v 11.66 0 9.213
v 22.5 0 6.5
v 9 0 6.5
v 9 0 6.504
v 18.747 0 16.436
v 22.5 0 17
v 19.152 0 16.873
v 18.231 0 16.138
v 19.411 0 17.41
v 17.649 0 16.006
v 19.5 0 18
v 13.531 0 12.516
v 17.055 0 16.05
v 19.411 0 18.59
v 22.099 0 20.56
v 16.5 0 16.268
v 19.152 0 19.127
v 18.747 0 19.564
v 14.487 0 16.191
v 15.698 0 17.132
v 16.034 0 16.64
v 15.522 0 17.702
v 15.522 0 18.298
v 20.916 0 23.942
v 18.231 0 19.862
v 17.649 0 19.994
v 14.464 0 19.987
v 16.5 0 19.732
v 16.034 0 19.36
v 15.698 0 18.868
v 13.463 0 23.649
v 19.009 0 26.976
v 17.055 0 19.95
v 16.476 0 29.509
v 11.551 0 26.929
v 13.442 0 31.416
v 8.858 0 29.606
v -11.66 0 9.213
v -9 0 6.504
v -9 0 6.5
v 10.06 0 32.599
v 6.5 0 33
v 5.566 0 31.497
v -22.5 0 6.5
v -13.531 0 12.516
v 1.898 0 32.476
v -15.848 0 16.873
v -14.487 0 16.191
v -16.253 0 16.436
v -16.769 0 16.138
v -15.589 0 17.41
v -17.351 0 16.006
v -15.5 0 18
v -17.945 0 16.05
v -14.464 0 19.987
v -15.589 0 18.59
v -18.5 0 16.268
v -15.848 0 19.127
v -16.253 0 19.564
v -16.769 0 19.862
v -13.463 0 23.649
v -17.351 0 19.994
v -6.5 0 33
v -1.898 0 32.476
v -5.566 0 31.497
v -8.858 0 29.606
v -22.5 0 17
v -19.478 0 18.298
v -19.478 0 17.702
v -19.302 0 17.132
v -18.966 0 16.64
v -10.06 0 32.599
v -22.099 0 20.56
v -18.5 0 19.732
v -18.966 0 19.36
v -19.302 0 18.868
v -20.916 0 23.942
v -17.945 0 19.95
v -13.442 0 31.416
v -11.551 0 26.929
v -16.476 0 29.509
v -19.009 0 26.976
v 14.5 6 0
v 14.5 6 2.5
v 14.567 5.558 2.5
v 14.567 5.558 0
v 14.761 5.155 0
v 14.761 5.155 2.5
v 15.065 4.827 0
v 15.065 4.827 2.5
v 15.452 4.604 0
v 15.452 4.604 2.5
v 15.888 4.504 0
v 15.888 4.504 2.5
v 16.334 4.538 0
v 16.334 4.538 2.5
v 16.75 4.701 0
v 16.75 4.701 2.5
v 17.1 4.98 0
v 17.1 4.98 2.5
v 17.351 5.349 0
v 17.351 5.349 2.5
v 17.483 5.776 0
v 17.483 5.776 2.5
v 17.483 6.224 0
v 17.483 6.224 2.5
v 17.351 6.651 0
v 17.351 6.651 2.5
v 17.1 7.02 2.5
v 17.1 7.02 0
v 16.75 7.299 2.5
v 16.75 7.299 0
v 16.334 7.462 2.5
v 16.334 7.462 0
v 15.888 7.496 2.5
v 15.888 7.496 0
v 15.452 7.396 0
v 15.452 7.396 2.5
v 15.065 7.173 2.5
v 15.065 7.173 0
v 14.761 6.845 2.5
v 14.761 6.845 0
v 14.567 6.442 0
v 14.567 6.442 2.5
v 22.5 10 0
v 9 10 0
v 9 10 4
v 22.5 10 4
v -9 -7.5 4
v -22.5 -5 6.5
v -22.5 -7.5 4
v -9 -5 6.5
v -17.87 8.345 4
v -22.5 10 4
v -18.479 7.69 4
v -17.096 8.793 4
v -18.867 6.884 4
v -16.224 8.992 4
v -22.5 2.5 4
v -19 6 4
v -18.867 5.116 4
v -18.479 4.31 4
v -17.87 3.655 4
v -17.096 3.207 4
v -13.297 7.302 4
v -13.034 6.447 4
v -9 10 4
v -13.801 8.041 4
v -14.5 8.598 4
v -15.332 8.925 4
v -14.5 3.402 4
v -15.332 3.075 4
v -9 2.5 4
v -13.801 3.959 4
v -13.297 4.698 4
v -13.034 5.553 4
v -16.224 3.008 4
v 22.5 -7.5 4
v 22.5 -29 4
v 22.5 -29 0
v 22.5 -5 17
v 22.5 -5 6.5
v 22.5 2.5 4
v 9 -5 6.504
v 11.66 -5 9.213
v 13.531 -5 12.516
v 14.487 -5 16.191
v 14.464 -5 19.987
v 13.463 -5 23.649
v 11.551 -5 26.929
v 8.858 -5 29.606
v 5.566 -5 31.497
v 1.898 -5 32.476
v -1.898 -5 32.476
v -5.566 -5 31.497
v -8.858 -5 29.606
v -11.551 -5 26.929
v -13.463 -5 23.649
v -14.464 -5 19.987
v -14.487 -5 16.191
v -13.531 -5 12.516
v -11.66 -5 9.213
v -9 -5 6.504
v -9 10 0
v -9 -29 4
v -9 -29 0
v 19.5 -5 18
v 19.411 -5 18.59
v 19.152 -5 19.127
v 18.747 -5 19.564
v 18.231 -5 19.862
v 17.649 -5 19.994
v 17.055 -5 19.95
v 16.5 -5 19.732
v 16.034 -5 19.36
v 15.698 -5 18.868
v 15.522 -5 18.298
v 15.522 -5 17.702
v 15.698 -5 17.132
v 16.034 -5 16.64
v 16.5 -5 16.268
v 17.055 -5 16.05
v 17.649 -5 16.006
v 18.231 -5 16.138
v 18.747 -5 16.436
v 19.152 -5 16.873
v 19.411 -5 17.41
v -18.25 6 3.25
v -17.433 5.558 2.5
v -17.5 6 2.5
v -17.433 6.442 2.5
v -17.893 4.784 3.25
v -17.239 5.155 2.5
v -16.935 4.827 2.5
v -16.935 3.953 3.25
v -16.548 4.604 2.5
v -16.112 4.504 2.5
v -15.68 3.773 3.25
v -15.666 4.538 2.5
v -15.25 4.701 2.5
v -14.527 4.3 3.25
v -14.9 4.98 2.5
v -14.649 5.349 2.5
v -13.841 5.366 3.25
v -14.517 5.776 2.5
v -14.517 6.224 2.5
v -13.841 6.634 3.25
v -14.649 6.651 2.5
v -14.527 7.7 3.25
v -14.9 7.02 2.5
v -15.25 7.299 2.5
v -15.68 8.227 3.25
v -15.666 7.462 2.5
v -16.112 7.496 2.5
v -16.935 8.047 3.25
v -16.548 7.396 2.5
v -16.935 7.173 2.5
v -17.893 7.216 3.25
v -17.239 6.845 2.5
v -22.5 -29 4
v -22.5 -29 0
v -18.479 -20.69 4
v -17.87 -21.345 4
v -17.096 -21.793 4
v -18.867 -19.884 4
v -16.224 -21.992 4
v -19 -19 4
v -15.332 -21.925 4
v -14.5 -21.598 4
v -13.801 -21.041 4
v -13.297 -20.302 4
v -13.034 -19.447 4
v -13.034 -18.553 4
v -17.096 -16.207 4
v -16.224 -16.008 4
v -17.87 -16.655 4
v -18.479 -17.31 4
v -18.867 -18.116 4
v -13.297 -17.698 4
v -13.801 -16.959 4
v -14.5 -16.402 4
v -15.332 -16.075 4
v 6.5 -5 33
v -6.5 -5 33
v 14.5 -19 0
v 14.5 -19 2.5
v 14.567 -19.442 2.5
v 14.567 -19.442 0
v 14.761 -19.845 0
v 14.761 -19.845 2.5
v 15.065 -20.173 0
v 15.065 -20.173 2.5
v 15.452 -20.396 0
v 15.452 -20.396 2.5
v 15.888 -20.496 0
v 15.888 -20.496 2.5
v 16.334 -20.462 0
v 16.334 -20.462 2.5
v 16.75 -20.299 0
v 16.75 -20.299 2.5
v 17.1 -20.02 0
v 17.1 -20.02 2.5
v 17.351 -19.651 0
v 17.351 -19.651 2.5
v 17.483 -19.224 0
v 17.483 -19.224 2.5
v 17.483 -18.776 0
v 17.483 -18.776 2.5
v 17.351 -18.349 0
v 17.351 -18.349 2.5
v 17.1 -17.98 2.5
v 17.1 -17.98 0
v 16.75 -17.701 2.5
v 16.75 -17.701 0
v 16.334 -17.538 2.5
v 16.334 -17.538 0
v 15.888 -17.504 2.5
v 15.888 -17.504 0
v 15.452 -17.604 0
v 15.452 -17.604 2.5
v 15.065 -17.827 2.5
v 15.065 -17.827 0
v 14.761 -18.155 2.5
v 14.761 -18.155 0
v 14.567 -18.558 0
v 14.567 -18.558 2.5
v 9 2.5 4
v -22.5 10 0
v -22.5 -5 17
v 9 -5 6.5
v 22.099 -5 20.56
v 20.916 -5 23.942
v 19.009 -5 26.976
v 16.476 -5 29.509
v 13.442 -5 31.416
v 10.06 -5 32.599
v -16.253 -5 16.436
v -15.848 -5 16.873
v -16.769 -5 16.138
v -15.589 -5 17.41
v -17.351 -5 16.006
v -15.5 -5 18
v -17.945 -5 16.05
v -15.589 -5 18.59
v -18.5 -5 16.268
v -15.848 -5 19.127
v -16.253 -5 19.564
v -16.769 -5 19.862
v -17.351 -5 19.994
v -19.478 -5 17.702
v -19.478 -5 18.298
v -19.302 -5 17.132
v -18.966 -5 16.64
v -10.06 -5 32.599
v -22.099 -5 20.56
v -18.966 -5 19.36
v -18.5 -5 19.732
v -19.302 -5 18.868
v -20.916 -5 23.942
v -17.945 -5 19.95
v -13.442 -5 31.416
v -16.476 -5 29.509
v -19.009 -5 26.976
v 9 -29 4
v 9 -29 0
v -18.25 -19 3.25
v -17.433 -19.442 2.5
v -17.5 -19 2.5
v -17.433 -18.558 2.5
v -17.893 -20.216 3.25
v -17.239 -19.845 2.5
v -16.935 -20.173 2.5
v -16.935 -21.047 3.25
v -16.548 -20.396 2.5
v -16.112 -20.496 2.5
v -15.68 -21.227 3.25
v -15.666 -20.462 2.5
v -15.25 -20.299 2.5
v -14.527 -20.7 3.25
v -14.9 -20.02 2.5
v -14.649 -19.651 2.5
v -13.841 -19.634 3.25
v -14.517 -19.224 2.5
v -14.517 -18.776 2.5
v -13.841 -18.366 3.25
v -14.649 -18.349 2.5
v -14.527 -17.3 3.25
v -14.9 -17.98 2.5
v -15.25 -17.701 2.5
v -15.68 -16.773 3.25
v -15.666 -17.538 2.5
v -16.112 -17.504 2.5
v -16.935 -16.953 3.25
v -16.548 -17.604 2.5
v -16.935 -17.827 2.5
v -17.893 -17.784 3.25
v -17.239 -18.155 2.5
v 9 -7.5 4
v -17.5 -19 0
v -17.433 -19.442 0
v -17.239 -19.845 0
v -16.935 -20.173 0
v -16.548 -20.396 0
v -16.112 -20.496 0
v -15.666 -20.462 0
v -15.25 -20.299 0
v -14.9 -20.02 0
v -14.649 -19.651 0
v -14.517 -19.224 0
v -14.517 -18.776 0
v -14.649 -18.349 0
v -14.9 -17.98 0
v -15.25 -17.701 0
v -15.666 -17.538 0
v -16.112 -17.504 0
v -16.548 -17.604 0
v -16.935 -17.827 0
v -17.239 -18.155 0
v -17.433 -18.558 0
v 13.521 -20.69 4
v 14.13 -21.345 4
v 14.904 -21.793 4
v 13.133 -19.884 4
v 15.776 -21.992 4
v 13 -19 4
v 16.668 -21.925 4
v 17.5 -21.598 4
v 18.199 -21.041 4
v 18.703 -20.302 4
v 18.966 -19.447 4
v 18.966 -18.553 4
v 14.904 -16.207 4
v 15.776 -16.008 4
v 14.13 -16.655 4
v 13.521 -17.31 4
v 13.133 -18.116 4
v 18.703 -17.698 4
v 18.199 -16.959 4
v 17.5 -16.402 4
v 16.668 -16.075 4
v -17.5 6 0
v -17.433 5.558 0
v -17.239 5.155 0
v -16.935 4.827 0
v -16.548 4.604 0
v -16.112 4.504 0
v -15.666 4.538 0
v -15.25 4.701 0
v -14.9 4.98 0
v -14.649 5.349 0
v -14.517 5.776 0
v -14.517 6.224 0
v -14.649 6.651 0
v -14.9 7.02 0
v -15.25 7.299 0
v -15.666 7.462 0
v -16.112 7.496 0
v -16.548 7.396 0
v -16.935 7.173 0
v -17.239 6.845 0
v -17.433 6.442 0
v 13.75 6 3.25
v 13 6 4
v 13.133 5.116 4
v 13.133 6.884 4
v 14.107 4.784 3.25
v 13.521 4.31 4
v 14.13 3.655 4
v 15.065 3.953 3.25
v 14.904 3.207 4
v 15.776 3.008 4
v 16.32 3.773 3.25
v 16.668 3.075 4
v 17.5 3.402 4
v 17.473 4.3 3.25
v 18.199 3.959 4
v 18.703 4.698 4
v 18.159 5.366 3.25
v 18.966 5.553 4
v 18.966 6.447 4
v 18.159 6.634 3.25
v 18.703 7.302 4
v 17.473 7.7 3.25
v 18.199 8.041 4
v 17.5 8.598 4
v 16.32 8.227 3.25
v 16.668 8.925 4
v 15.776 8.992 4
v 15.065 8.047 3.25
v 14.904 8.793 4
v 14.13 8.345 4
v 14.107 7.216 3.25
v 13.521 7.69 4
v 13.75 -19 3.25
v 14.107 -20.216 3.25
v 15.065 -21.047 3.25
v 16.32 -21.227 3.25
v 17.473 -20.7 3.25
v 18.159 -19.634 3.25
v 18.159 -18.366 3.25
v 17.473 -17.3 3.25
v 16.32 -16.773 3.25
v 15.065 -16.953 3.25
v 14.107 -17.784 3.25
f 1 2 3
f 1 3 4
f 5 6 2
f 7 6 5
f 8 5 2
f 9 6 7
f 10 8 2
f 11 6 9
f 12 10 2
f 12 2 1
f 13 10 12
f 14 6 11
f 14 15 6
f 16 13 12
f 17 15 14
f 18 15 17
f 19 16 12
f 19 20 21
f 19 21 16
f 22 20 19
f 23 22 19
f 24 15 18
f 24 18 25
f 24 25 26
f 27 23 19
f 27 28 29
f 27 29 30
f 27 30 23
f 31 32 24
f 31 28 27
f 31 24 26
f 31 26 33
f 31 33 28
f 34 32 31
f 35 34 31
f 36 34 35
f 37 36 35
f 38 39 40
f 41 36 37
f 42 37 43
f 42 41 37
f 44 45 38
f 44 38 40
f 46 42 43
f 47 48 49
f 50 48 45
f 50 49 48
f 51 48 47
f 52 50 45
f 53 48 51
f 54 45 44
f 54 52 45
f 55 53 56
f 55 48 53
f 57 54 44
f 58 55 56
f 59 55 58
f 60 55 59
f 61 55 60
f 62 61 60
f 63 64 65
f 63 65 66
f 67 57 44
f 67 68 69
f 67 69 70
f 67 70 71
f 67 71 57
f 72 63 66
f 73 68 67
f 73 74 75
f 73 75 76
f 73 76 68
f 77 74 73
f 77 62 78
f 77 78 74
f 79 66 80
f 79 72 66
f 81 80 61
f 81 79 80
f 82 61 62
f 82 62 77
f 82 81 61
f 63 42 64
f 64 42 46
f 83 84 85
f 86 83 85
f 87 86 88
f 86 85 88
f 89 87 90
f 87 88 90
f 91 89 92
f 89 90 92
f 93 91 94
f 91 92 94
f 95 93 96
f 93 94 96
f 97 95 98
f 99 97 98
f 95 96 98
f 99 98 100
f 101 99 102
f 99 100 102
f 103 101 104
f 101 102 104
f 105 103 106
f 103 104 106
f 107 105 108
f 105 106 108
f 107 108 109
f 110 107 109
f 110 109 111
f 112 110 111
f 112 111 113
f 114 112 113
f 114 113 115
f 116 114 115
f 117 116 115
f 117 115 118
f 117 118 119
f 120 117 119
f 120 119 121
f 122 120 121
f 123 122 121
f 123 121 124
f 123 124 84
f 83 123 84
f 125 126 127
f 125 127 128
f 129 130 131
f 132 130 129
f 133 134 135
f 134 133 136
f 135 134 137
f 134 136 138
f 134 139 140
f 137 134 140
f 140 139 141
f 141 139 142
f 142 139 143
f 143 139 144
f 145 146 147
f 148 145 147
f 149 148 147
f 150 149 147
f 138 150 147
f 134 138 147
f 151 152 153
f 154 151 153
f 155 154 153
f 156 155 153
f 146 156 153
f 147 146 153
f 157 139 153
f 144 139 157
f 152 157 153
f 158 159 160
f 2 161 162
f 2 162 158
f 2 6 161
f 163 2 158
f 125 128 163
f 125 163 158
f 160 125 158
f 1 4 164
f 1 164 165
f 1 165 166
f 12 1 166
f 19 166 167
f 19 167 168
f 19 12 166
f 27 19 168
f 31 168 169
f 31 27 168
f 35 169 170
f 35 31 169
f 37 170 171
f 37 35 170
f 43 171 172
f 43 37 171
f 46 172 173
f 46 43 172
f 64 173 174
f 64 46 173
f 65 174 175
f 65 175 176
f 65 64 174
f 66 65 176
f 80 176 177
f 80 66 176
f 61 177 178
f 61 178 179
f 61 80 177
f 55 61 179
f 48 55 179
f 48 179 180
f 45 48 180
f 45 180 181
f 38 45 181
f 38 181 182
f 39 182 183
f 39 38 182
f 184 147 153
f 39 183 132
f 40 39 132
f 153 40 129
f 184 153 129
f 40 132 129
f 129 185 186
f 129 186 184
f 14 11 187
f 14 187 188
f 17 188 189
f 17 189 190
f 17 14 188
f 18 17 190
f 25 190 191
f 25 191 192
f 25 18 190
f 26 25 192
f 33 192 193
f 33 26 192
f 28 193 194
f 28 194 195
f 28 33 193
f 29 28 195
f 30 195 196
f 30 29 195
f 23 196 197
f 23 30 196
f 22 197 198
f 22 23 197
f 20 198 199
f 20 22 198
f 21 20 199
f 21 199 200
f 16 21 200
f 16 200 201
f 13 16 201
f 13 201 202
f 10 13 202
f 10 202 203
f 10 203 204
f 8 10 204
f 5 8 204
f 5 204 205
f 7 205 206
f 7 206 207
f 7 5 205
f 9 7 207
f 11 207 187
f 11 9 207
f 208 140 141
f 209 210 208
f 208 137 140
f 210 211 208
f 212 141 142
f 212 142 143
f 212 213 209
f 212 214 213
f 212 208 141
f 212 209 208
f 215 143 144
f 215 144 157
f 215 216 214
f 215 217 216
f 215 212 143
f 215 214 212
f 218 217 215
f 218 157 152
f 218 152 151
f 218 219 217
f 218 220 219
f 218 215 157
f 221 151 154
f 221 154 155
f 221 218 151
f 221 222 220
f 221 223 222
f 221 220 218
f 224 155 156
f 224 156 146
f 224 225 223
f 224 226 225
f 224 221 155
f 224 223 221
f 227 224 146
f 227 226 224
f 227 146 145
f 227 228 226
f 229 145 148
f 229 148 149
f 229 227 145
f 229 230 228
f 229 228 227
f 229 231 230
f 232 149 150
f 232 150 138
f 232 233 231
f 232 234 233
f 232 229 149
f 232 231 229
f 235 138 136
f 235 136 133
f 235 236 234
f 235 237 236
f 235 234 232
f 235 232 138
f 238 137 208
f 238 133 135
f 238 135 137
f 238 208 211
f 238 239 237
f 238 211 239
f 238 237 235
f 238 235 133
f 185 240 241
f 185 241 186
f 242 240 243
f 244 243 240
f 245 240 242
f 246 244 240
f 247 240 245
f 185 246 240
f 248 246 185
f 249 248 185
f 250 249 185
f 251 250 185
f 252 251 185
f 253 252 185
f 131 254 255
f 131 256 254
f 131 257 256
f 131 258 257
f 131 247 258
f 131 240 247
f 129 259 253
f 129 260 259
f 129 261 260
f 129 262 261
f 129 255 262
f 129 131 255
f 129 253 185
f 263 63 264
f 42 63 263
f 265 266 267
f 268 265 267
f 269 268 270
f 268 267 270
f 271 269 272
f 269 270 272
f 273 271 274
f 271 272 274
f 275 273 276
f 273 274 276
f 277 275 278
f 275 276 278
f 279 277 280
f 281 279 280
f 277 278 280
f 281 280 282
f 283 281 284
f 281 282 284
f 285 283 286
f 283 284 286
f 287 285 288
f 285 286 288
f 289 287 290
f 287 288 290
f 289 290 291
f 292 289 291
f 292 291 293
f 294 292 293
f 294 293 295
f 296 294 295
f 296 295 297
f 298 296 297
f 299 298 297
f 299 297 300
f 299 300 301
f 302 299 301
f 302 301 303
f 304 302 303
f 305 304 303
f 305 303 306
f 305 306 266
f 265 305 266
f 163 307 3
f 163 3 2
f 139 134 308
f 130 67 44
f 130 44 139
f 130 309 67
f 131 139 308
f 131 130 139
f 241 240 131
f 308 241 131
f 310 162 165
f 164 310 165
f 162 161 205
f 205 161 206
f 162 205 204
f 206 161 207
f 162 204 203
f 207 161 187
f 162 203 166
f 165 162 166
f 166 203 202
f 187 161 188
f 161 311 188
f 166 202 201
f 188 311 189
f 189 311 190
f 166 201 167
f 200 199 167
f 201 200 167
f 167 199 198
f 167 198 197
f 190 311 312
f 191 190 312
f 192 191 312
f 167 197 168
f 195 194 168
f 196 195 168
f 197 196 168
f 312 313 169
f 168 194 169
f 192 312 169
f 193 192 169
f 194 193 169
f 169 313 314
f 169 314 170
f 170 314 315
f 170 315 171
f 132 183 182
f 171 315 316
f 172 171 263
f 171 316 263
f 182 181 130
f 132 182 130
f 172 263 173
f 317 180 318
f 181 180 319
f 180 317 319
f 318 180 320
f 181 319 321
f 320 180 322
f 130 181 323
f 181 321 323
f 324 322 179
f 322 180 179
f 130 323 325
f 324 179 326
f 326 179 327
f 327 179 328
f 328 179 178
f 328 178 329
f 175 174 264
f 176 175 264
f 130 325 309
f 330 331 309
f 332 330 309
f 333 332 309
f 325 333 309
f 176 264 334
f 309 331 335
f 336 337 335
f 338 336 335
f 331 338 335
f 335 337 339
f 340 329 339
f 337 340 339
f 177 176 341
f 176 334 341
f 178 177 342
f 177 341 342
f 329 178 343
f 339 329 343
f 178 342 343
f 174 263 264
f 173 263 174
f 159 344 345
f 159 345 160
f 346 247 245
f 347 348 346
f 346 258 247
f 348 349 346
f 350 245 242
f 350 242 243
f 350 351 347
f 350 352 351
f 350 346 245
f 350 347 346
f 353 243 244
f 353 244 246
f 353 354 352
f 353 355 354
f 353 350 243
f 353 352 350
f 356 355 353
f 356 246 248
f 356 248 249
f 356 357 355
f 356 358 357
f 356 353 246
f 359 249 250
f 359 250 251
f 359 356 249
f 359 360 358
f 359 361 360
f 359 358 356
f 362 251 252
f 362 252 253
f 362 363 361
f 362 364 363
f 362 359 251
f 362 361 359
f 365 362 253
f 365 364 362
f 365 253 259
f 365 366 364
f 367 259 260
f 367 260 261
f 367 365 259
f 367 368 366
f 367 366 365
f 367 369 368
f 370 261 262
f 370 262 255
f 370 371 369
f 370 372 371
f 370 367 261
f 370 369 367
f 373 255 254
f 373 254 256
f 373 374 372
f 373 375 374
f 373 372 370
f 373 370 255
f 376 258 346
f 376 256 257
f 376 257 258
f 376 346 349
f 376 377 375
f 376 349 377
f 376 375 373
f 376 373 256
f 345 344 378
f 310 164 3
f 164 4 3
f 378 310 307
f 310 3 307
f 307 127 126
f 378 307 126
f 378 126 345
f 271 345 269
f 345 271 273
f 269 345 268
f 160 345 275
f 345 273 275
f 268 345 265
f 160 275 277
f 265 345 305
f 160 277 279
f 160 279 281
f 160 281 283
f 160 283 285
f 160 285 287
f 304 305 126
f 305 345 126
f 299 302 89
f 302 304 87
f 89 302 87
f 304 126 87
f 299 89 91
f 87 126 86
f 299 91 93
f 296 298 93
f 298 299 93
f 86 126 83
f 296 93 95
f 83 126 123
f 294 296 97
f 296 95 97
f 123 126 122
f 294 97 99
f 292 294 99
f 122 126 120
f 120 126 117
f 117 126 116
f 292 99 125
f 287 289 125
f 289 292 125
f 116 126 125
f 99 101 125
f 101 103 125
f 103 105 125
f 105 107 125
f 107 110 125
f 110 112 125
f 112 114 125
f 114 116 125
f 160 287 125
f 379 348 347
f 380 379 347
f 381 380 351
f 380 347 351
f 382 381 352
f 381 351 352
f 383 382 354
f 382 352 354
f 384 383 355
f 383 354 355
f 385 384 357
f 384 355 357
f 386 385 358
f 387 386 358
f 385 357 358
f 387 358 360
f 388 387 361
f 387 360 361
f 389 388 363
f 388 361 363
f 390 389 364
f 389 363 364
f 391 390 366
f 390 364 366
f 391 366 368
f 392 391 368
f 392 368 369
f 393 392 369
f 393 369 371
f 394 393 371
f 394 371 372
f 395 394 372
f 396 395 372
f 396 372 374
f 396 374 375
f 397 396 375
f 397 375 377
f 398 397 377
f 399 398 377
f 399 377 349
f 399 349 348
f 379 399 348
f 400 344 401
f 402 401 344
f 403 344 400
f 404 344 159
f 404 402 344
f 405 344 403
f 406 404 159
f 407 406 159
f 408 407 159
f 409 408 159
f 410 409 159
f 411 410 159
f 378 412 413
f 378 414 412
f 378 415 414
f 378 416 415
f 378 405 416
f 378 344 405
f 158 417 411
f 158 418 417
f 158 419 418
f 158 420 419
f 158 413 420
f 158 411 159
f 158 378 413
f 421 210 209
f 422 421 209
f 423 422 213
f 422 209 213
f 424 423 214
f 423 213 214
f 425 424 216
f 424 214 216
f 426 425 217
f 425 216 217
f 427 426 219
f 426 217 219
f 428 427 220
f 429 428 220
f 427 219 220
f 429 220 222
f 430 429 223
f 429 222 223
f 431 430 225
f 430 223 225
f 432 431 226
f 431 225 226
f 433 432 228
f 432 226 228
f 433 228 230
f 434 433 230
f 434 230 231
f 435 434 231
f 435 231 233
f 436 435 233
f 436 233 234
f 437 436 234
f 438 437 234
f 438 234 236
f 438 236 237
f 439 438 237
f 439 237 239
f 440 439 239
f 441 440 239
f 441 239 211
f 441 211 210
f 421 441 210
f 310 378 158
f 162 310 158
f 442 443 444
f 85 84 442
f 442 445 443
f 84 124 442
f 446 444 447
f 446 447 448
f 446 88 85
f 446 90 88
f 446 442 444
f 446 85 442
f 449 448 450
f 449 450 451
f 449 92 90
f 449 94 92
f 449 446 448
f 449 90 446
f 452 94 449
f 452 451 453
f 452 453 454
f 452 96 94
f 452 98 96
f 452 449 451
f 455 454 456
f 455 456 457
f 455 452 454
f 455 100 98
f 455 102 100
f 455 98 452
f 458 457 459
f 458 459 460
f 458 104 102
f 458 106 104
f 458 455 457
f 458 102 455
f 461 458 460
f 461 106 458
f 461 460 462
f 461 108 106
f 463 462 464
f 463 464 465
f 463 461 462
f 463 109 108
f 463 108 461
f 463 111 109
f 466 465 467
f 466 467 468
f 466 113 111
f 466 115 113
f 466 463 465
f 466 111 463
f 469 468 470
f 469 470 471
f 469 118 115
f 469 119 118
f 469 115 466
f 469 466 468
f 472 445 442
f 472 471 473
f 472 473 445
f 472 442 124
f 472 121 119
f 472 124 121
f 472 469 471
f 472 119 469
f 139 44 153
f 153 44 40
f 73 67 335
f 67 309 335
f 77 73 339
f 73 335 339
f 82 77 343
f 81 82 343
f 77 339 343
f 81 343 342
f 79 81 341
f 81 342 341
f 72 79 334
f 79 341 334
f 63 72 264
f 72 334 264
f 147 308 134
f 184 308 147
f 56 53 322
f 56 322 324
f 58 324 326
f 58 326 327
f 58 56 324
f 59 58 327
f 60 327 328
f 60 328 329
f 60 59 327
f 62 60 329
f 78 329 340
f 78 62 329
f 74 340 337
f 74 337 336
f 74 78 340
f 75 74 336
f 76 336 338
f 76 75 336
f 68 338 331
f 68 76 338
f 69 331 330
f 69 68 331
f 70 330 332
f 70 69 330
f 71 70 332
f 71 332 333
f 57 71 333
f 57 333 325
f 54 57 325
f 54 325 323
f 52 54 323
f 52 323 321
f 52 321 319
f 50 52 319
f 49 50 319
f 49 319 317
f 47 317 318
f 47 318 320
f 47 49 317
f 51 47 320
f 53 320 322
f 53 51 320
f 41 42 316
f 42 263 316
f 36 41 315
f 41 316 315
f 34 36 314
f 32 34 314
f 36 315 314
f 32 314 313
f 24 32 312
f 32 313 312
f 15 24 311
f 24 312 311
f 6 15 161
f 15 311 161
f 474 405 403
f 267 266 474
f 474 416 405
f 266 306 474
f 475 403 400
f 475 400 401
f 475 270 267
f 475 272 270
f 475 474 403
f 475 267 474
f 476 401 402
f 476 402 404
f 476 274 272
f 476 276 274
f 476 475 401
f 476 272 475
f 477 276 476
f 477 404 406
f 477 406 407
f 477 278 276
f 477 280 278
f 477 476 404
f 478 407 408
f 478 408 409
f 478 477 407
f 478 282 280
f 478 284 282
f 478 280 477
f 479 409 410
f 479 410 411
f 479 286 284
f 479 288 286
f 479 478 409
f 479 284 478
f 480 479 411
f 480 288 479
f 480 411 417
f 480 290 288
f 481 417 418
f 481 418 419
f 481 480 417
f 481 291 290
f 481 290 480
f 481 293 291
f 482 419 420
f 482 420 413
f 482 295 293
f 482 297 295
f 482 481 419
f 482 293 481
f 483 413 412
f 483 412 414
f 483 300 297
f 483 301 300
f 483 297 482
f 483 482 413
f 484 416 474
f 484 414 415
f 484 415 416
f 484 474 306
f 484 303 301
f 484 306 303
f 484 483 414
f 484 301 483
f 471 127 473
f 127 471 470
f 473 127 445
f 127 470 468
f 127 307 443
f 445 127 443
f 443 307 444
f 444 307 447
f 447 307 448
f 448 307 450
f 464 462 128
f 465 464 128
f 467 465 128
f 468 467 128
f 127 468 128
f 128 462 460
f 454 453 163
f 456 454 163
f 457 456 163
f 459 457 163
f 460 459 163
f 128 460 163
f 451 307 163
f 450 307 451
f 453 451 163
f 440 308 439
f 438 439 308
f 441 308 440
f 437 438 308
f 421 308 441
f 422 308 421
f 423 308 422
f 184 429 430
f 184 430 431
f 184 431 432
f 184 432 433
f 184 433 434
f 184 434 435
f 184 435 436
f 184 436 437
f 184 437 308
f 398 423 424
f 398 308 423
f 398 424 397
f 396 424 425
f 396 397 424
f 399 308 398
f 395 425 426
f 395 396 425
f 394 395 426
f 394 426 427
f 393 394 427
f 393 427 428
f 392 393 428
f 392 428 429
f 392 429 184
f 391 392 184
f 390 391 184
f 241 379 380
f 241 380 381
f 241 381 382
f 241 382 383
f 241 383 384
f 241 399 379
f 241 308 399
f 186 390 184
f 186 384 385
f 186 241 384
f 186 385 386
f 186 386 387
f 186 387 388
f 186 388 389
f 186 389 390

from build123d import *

# Parameters (mm, degrees)
SKETCH001_R     = 2
PAD_DEPTH       = 5
SKETCH_W        = 13.5
SKETCH_H        = 4
PAD001_DEPTH    = 24
SKETCH002_W     = 13.5
SKETCH002_H     = 4
PAD002_DEPTH    = 10
SKETCH003_R     = 1.5
POCKET_DEPTH    = 5
CHAMFER_SIZE    = 1.5
CHAMFER001_SIZE = 2.5
FILLET_R        = 16


with BuildPart() as part:
    # Sketch001 → Pad (new body)
    with BuildSketch(Plane.XZ):
        with BuildLine():
            Line((-22.5, 33), (22.5, 33))
            Line((22.5, 33), (22.5, 0))
            Line((9, 0), (22.5, 0))
            Line((9, 6.503914), (9, 0))
            ThreePointArc((9, 6.503914), (0, 32.6), (-9, 6.503914))
            Line((-9, 0), (-9, 6.503914))
            Line((-22.5, 0), (-9, 0))
            Line((-22.5, 0), (-22.5, 33))
        make_face()
        with Locations((-17.5, 18)):
            Circle(SKETCH001_R, mode=Mode.SUBTRACT)
        with Locations((17.5, 18)):
            Circle(SKETCH001_R, mode=Mode.SUBTRACT)
    extrude(amount=PAD_DEPTH)

    # Sketch (on Face12 of Pad) → Pad001 (join)
    with BuildSketch(Plane.XZ.offset(5)):
        with Locations((-15.75, 2)):
            Rectangle(SKETCH_W, SKETCH_H)
        with Locations((15.75, 2)):
            Rectangle(SKETCH_W, SKETCH_H)
    extrude(amount=PAD001_DEPTH)

    # Sketch002 (on Face1 of Pad001) → Pad002 (join)
    with BuildSketch(Plane(origin=(0, 0, 0), x_dir=(1, 0, 0), z_dir=(0, 1, 0))):
        with Locations((-15.75, -2)):
            Rectangle(SKETCH002_W, SKETCH002_H)
        with Locations((15.75, -2)):
            Rectangle(SKETCH002_W, SKETCH002_H)
    extrude(amount=PAD002_DEPTH)

    # Sketch003 (on Face6 of Pad002) → Pocket (cut)
    with BuildSketch(Plane(origin=(0, 0, 4), x_dir=(-1, 0, 0), z_dir=(0, 0, 1))):
        with Locations((-16, 19)):
            Circle(SKETCH003_R)
        with Locations((16, 19)):
            Circle(SKETCH003_R)
        with Locations((-16, -6)):
            Circle(SKETCH003_R)
        with Locations((16, -6)):
            Circle(SKETCH003_R)
    extrude(amount=-POCKET_DEPTH, mode=Mode.SUBTRACT)

    # Chamfer
    chamfer_edges = [part.edges().sort_by_distance(p)[0] for p in [
        (-14.5, -19, 4),
        (17.5, -19, 4),
        (-14.5, 6, 4),
        (17.5, 6, 4),
    ]]
    chamfer(chamfer_edges, length=CHAMFER_SIZE)

    # Chamfer001
    chamfer001_edges = [part.edges().sort_by_distance(p)[0] for p in [
        (-15.75, -5, 4),
        (15.75, -5, 4),
        (15.75, 0, 4),
        (-15.75, 0, 4),
    ]]
    chamfer(chamfer001_edges, length=CHAMFER001_SIZE)

    # Fillet
    fillet_edges = [part.edges().sort_by_distance(p)[0] for p in [
        (-22.5, -2.5, 33),
        (22.5, -2.5, 33),
    ]]
    fillet(fillet_edges, radius=FILLET_R)


solid = part.part
